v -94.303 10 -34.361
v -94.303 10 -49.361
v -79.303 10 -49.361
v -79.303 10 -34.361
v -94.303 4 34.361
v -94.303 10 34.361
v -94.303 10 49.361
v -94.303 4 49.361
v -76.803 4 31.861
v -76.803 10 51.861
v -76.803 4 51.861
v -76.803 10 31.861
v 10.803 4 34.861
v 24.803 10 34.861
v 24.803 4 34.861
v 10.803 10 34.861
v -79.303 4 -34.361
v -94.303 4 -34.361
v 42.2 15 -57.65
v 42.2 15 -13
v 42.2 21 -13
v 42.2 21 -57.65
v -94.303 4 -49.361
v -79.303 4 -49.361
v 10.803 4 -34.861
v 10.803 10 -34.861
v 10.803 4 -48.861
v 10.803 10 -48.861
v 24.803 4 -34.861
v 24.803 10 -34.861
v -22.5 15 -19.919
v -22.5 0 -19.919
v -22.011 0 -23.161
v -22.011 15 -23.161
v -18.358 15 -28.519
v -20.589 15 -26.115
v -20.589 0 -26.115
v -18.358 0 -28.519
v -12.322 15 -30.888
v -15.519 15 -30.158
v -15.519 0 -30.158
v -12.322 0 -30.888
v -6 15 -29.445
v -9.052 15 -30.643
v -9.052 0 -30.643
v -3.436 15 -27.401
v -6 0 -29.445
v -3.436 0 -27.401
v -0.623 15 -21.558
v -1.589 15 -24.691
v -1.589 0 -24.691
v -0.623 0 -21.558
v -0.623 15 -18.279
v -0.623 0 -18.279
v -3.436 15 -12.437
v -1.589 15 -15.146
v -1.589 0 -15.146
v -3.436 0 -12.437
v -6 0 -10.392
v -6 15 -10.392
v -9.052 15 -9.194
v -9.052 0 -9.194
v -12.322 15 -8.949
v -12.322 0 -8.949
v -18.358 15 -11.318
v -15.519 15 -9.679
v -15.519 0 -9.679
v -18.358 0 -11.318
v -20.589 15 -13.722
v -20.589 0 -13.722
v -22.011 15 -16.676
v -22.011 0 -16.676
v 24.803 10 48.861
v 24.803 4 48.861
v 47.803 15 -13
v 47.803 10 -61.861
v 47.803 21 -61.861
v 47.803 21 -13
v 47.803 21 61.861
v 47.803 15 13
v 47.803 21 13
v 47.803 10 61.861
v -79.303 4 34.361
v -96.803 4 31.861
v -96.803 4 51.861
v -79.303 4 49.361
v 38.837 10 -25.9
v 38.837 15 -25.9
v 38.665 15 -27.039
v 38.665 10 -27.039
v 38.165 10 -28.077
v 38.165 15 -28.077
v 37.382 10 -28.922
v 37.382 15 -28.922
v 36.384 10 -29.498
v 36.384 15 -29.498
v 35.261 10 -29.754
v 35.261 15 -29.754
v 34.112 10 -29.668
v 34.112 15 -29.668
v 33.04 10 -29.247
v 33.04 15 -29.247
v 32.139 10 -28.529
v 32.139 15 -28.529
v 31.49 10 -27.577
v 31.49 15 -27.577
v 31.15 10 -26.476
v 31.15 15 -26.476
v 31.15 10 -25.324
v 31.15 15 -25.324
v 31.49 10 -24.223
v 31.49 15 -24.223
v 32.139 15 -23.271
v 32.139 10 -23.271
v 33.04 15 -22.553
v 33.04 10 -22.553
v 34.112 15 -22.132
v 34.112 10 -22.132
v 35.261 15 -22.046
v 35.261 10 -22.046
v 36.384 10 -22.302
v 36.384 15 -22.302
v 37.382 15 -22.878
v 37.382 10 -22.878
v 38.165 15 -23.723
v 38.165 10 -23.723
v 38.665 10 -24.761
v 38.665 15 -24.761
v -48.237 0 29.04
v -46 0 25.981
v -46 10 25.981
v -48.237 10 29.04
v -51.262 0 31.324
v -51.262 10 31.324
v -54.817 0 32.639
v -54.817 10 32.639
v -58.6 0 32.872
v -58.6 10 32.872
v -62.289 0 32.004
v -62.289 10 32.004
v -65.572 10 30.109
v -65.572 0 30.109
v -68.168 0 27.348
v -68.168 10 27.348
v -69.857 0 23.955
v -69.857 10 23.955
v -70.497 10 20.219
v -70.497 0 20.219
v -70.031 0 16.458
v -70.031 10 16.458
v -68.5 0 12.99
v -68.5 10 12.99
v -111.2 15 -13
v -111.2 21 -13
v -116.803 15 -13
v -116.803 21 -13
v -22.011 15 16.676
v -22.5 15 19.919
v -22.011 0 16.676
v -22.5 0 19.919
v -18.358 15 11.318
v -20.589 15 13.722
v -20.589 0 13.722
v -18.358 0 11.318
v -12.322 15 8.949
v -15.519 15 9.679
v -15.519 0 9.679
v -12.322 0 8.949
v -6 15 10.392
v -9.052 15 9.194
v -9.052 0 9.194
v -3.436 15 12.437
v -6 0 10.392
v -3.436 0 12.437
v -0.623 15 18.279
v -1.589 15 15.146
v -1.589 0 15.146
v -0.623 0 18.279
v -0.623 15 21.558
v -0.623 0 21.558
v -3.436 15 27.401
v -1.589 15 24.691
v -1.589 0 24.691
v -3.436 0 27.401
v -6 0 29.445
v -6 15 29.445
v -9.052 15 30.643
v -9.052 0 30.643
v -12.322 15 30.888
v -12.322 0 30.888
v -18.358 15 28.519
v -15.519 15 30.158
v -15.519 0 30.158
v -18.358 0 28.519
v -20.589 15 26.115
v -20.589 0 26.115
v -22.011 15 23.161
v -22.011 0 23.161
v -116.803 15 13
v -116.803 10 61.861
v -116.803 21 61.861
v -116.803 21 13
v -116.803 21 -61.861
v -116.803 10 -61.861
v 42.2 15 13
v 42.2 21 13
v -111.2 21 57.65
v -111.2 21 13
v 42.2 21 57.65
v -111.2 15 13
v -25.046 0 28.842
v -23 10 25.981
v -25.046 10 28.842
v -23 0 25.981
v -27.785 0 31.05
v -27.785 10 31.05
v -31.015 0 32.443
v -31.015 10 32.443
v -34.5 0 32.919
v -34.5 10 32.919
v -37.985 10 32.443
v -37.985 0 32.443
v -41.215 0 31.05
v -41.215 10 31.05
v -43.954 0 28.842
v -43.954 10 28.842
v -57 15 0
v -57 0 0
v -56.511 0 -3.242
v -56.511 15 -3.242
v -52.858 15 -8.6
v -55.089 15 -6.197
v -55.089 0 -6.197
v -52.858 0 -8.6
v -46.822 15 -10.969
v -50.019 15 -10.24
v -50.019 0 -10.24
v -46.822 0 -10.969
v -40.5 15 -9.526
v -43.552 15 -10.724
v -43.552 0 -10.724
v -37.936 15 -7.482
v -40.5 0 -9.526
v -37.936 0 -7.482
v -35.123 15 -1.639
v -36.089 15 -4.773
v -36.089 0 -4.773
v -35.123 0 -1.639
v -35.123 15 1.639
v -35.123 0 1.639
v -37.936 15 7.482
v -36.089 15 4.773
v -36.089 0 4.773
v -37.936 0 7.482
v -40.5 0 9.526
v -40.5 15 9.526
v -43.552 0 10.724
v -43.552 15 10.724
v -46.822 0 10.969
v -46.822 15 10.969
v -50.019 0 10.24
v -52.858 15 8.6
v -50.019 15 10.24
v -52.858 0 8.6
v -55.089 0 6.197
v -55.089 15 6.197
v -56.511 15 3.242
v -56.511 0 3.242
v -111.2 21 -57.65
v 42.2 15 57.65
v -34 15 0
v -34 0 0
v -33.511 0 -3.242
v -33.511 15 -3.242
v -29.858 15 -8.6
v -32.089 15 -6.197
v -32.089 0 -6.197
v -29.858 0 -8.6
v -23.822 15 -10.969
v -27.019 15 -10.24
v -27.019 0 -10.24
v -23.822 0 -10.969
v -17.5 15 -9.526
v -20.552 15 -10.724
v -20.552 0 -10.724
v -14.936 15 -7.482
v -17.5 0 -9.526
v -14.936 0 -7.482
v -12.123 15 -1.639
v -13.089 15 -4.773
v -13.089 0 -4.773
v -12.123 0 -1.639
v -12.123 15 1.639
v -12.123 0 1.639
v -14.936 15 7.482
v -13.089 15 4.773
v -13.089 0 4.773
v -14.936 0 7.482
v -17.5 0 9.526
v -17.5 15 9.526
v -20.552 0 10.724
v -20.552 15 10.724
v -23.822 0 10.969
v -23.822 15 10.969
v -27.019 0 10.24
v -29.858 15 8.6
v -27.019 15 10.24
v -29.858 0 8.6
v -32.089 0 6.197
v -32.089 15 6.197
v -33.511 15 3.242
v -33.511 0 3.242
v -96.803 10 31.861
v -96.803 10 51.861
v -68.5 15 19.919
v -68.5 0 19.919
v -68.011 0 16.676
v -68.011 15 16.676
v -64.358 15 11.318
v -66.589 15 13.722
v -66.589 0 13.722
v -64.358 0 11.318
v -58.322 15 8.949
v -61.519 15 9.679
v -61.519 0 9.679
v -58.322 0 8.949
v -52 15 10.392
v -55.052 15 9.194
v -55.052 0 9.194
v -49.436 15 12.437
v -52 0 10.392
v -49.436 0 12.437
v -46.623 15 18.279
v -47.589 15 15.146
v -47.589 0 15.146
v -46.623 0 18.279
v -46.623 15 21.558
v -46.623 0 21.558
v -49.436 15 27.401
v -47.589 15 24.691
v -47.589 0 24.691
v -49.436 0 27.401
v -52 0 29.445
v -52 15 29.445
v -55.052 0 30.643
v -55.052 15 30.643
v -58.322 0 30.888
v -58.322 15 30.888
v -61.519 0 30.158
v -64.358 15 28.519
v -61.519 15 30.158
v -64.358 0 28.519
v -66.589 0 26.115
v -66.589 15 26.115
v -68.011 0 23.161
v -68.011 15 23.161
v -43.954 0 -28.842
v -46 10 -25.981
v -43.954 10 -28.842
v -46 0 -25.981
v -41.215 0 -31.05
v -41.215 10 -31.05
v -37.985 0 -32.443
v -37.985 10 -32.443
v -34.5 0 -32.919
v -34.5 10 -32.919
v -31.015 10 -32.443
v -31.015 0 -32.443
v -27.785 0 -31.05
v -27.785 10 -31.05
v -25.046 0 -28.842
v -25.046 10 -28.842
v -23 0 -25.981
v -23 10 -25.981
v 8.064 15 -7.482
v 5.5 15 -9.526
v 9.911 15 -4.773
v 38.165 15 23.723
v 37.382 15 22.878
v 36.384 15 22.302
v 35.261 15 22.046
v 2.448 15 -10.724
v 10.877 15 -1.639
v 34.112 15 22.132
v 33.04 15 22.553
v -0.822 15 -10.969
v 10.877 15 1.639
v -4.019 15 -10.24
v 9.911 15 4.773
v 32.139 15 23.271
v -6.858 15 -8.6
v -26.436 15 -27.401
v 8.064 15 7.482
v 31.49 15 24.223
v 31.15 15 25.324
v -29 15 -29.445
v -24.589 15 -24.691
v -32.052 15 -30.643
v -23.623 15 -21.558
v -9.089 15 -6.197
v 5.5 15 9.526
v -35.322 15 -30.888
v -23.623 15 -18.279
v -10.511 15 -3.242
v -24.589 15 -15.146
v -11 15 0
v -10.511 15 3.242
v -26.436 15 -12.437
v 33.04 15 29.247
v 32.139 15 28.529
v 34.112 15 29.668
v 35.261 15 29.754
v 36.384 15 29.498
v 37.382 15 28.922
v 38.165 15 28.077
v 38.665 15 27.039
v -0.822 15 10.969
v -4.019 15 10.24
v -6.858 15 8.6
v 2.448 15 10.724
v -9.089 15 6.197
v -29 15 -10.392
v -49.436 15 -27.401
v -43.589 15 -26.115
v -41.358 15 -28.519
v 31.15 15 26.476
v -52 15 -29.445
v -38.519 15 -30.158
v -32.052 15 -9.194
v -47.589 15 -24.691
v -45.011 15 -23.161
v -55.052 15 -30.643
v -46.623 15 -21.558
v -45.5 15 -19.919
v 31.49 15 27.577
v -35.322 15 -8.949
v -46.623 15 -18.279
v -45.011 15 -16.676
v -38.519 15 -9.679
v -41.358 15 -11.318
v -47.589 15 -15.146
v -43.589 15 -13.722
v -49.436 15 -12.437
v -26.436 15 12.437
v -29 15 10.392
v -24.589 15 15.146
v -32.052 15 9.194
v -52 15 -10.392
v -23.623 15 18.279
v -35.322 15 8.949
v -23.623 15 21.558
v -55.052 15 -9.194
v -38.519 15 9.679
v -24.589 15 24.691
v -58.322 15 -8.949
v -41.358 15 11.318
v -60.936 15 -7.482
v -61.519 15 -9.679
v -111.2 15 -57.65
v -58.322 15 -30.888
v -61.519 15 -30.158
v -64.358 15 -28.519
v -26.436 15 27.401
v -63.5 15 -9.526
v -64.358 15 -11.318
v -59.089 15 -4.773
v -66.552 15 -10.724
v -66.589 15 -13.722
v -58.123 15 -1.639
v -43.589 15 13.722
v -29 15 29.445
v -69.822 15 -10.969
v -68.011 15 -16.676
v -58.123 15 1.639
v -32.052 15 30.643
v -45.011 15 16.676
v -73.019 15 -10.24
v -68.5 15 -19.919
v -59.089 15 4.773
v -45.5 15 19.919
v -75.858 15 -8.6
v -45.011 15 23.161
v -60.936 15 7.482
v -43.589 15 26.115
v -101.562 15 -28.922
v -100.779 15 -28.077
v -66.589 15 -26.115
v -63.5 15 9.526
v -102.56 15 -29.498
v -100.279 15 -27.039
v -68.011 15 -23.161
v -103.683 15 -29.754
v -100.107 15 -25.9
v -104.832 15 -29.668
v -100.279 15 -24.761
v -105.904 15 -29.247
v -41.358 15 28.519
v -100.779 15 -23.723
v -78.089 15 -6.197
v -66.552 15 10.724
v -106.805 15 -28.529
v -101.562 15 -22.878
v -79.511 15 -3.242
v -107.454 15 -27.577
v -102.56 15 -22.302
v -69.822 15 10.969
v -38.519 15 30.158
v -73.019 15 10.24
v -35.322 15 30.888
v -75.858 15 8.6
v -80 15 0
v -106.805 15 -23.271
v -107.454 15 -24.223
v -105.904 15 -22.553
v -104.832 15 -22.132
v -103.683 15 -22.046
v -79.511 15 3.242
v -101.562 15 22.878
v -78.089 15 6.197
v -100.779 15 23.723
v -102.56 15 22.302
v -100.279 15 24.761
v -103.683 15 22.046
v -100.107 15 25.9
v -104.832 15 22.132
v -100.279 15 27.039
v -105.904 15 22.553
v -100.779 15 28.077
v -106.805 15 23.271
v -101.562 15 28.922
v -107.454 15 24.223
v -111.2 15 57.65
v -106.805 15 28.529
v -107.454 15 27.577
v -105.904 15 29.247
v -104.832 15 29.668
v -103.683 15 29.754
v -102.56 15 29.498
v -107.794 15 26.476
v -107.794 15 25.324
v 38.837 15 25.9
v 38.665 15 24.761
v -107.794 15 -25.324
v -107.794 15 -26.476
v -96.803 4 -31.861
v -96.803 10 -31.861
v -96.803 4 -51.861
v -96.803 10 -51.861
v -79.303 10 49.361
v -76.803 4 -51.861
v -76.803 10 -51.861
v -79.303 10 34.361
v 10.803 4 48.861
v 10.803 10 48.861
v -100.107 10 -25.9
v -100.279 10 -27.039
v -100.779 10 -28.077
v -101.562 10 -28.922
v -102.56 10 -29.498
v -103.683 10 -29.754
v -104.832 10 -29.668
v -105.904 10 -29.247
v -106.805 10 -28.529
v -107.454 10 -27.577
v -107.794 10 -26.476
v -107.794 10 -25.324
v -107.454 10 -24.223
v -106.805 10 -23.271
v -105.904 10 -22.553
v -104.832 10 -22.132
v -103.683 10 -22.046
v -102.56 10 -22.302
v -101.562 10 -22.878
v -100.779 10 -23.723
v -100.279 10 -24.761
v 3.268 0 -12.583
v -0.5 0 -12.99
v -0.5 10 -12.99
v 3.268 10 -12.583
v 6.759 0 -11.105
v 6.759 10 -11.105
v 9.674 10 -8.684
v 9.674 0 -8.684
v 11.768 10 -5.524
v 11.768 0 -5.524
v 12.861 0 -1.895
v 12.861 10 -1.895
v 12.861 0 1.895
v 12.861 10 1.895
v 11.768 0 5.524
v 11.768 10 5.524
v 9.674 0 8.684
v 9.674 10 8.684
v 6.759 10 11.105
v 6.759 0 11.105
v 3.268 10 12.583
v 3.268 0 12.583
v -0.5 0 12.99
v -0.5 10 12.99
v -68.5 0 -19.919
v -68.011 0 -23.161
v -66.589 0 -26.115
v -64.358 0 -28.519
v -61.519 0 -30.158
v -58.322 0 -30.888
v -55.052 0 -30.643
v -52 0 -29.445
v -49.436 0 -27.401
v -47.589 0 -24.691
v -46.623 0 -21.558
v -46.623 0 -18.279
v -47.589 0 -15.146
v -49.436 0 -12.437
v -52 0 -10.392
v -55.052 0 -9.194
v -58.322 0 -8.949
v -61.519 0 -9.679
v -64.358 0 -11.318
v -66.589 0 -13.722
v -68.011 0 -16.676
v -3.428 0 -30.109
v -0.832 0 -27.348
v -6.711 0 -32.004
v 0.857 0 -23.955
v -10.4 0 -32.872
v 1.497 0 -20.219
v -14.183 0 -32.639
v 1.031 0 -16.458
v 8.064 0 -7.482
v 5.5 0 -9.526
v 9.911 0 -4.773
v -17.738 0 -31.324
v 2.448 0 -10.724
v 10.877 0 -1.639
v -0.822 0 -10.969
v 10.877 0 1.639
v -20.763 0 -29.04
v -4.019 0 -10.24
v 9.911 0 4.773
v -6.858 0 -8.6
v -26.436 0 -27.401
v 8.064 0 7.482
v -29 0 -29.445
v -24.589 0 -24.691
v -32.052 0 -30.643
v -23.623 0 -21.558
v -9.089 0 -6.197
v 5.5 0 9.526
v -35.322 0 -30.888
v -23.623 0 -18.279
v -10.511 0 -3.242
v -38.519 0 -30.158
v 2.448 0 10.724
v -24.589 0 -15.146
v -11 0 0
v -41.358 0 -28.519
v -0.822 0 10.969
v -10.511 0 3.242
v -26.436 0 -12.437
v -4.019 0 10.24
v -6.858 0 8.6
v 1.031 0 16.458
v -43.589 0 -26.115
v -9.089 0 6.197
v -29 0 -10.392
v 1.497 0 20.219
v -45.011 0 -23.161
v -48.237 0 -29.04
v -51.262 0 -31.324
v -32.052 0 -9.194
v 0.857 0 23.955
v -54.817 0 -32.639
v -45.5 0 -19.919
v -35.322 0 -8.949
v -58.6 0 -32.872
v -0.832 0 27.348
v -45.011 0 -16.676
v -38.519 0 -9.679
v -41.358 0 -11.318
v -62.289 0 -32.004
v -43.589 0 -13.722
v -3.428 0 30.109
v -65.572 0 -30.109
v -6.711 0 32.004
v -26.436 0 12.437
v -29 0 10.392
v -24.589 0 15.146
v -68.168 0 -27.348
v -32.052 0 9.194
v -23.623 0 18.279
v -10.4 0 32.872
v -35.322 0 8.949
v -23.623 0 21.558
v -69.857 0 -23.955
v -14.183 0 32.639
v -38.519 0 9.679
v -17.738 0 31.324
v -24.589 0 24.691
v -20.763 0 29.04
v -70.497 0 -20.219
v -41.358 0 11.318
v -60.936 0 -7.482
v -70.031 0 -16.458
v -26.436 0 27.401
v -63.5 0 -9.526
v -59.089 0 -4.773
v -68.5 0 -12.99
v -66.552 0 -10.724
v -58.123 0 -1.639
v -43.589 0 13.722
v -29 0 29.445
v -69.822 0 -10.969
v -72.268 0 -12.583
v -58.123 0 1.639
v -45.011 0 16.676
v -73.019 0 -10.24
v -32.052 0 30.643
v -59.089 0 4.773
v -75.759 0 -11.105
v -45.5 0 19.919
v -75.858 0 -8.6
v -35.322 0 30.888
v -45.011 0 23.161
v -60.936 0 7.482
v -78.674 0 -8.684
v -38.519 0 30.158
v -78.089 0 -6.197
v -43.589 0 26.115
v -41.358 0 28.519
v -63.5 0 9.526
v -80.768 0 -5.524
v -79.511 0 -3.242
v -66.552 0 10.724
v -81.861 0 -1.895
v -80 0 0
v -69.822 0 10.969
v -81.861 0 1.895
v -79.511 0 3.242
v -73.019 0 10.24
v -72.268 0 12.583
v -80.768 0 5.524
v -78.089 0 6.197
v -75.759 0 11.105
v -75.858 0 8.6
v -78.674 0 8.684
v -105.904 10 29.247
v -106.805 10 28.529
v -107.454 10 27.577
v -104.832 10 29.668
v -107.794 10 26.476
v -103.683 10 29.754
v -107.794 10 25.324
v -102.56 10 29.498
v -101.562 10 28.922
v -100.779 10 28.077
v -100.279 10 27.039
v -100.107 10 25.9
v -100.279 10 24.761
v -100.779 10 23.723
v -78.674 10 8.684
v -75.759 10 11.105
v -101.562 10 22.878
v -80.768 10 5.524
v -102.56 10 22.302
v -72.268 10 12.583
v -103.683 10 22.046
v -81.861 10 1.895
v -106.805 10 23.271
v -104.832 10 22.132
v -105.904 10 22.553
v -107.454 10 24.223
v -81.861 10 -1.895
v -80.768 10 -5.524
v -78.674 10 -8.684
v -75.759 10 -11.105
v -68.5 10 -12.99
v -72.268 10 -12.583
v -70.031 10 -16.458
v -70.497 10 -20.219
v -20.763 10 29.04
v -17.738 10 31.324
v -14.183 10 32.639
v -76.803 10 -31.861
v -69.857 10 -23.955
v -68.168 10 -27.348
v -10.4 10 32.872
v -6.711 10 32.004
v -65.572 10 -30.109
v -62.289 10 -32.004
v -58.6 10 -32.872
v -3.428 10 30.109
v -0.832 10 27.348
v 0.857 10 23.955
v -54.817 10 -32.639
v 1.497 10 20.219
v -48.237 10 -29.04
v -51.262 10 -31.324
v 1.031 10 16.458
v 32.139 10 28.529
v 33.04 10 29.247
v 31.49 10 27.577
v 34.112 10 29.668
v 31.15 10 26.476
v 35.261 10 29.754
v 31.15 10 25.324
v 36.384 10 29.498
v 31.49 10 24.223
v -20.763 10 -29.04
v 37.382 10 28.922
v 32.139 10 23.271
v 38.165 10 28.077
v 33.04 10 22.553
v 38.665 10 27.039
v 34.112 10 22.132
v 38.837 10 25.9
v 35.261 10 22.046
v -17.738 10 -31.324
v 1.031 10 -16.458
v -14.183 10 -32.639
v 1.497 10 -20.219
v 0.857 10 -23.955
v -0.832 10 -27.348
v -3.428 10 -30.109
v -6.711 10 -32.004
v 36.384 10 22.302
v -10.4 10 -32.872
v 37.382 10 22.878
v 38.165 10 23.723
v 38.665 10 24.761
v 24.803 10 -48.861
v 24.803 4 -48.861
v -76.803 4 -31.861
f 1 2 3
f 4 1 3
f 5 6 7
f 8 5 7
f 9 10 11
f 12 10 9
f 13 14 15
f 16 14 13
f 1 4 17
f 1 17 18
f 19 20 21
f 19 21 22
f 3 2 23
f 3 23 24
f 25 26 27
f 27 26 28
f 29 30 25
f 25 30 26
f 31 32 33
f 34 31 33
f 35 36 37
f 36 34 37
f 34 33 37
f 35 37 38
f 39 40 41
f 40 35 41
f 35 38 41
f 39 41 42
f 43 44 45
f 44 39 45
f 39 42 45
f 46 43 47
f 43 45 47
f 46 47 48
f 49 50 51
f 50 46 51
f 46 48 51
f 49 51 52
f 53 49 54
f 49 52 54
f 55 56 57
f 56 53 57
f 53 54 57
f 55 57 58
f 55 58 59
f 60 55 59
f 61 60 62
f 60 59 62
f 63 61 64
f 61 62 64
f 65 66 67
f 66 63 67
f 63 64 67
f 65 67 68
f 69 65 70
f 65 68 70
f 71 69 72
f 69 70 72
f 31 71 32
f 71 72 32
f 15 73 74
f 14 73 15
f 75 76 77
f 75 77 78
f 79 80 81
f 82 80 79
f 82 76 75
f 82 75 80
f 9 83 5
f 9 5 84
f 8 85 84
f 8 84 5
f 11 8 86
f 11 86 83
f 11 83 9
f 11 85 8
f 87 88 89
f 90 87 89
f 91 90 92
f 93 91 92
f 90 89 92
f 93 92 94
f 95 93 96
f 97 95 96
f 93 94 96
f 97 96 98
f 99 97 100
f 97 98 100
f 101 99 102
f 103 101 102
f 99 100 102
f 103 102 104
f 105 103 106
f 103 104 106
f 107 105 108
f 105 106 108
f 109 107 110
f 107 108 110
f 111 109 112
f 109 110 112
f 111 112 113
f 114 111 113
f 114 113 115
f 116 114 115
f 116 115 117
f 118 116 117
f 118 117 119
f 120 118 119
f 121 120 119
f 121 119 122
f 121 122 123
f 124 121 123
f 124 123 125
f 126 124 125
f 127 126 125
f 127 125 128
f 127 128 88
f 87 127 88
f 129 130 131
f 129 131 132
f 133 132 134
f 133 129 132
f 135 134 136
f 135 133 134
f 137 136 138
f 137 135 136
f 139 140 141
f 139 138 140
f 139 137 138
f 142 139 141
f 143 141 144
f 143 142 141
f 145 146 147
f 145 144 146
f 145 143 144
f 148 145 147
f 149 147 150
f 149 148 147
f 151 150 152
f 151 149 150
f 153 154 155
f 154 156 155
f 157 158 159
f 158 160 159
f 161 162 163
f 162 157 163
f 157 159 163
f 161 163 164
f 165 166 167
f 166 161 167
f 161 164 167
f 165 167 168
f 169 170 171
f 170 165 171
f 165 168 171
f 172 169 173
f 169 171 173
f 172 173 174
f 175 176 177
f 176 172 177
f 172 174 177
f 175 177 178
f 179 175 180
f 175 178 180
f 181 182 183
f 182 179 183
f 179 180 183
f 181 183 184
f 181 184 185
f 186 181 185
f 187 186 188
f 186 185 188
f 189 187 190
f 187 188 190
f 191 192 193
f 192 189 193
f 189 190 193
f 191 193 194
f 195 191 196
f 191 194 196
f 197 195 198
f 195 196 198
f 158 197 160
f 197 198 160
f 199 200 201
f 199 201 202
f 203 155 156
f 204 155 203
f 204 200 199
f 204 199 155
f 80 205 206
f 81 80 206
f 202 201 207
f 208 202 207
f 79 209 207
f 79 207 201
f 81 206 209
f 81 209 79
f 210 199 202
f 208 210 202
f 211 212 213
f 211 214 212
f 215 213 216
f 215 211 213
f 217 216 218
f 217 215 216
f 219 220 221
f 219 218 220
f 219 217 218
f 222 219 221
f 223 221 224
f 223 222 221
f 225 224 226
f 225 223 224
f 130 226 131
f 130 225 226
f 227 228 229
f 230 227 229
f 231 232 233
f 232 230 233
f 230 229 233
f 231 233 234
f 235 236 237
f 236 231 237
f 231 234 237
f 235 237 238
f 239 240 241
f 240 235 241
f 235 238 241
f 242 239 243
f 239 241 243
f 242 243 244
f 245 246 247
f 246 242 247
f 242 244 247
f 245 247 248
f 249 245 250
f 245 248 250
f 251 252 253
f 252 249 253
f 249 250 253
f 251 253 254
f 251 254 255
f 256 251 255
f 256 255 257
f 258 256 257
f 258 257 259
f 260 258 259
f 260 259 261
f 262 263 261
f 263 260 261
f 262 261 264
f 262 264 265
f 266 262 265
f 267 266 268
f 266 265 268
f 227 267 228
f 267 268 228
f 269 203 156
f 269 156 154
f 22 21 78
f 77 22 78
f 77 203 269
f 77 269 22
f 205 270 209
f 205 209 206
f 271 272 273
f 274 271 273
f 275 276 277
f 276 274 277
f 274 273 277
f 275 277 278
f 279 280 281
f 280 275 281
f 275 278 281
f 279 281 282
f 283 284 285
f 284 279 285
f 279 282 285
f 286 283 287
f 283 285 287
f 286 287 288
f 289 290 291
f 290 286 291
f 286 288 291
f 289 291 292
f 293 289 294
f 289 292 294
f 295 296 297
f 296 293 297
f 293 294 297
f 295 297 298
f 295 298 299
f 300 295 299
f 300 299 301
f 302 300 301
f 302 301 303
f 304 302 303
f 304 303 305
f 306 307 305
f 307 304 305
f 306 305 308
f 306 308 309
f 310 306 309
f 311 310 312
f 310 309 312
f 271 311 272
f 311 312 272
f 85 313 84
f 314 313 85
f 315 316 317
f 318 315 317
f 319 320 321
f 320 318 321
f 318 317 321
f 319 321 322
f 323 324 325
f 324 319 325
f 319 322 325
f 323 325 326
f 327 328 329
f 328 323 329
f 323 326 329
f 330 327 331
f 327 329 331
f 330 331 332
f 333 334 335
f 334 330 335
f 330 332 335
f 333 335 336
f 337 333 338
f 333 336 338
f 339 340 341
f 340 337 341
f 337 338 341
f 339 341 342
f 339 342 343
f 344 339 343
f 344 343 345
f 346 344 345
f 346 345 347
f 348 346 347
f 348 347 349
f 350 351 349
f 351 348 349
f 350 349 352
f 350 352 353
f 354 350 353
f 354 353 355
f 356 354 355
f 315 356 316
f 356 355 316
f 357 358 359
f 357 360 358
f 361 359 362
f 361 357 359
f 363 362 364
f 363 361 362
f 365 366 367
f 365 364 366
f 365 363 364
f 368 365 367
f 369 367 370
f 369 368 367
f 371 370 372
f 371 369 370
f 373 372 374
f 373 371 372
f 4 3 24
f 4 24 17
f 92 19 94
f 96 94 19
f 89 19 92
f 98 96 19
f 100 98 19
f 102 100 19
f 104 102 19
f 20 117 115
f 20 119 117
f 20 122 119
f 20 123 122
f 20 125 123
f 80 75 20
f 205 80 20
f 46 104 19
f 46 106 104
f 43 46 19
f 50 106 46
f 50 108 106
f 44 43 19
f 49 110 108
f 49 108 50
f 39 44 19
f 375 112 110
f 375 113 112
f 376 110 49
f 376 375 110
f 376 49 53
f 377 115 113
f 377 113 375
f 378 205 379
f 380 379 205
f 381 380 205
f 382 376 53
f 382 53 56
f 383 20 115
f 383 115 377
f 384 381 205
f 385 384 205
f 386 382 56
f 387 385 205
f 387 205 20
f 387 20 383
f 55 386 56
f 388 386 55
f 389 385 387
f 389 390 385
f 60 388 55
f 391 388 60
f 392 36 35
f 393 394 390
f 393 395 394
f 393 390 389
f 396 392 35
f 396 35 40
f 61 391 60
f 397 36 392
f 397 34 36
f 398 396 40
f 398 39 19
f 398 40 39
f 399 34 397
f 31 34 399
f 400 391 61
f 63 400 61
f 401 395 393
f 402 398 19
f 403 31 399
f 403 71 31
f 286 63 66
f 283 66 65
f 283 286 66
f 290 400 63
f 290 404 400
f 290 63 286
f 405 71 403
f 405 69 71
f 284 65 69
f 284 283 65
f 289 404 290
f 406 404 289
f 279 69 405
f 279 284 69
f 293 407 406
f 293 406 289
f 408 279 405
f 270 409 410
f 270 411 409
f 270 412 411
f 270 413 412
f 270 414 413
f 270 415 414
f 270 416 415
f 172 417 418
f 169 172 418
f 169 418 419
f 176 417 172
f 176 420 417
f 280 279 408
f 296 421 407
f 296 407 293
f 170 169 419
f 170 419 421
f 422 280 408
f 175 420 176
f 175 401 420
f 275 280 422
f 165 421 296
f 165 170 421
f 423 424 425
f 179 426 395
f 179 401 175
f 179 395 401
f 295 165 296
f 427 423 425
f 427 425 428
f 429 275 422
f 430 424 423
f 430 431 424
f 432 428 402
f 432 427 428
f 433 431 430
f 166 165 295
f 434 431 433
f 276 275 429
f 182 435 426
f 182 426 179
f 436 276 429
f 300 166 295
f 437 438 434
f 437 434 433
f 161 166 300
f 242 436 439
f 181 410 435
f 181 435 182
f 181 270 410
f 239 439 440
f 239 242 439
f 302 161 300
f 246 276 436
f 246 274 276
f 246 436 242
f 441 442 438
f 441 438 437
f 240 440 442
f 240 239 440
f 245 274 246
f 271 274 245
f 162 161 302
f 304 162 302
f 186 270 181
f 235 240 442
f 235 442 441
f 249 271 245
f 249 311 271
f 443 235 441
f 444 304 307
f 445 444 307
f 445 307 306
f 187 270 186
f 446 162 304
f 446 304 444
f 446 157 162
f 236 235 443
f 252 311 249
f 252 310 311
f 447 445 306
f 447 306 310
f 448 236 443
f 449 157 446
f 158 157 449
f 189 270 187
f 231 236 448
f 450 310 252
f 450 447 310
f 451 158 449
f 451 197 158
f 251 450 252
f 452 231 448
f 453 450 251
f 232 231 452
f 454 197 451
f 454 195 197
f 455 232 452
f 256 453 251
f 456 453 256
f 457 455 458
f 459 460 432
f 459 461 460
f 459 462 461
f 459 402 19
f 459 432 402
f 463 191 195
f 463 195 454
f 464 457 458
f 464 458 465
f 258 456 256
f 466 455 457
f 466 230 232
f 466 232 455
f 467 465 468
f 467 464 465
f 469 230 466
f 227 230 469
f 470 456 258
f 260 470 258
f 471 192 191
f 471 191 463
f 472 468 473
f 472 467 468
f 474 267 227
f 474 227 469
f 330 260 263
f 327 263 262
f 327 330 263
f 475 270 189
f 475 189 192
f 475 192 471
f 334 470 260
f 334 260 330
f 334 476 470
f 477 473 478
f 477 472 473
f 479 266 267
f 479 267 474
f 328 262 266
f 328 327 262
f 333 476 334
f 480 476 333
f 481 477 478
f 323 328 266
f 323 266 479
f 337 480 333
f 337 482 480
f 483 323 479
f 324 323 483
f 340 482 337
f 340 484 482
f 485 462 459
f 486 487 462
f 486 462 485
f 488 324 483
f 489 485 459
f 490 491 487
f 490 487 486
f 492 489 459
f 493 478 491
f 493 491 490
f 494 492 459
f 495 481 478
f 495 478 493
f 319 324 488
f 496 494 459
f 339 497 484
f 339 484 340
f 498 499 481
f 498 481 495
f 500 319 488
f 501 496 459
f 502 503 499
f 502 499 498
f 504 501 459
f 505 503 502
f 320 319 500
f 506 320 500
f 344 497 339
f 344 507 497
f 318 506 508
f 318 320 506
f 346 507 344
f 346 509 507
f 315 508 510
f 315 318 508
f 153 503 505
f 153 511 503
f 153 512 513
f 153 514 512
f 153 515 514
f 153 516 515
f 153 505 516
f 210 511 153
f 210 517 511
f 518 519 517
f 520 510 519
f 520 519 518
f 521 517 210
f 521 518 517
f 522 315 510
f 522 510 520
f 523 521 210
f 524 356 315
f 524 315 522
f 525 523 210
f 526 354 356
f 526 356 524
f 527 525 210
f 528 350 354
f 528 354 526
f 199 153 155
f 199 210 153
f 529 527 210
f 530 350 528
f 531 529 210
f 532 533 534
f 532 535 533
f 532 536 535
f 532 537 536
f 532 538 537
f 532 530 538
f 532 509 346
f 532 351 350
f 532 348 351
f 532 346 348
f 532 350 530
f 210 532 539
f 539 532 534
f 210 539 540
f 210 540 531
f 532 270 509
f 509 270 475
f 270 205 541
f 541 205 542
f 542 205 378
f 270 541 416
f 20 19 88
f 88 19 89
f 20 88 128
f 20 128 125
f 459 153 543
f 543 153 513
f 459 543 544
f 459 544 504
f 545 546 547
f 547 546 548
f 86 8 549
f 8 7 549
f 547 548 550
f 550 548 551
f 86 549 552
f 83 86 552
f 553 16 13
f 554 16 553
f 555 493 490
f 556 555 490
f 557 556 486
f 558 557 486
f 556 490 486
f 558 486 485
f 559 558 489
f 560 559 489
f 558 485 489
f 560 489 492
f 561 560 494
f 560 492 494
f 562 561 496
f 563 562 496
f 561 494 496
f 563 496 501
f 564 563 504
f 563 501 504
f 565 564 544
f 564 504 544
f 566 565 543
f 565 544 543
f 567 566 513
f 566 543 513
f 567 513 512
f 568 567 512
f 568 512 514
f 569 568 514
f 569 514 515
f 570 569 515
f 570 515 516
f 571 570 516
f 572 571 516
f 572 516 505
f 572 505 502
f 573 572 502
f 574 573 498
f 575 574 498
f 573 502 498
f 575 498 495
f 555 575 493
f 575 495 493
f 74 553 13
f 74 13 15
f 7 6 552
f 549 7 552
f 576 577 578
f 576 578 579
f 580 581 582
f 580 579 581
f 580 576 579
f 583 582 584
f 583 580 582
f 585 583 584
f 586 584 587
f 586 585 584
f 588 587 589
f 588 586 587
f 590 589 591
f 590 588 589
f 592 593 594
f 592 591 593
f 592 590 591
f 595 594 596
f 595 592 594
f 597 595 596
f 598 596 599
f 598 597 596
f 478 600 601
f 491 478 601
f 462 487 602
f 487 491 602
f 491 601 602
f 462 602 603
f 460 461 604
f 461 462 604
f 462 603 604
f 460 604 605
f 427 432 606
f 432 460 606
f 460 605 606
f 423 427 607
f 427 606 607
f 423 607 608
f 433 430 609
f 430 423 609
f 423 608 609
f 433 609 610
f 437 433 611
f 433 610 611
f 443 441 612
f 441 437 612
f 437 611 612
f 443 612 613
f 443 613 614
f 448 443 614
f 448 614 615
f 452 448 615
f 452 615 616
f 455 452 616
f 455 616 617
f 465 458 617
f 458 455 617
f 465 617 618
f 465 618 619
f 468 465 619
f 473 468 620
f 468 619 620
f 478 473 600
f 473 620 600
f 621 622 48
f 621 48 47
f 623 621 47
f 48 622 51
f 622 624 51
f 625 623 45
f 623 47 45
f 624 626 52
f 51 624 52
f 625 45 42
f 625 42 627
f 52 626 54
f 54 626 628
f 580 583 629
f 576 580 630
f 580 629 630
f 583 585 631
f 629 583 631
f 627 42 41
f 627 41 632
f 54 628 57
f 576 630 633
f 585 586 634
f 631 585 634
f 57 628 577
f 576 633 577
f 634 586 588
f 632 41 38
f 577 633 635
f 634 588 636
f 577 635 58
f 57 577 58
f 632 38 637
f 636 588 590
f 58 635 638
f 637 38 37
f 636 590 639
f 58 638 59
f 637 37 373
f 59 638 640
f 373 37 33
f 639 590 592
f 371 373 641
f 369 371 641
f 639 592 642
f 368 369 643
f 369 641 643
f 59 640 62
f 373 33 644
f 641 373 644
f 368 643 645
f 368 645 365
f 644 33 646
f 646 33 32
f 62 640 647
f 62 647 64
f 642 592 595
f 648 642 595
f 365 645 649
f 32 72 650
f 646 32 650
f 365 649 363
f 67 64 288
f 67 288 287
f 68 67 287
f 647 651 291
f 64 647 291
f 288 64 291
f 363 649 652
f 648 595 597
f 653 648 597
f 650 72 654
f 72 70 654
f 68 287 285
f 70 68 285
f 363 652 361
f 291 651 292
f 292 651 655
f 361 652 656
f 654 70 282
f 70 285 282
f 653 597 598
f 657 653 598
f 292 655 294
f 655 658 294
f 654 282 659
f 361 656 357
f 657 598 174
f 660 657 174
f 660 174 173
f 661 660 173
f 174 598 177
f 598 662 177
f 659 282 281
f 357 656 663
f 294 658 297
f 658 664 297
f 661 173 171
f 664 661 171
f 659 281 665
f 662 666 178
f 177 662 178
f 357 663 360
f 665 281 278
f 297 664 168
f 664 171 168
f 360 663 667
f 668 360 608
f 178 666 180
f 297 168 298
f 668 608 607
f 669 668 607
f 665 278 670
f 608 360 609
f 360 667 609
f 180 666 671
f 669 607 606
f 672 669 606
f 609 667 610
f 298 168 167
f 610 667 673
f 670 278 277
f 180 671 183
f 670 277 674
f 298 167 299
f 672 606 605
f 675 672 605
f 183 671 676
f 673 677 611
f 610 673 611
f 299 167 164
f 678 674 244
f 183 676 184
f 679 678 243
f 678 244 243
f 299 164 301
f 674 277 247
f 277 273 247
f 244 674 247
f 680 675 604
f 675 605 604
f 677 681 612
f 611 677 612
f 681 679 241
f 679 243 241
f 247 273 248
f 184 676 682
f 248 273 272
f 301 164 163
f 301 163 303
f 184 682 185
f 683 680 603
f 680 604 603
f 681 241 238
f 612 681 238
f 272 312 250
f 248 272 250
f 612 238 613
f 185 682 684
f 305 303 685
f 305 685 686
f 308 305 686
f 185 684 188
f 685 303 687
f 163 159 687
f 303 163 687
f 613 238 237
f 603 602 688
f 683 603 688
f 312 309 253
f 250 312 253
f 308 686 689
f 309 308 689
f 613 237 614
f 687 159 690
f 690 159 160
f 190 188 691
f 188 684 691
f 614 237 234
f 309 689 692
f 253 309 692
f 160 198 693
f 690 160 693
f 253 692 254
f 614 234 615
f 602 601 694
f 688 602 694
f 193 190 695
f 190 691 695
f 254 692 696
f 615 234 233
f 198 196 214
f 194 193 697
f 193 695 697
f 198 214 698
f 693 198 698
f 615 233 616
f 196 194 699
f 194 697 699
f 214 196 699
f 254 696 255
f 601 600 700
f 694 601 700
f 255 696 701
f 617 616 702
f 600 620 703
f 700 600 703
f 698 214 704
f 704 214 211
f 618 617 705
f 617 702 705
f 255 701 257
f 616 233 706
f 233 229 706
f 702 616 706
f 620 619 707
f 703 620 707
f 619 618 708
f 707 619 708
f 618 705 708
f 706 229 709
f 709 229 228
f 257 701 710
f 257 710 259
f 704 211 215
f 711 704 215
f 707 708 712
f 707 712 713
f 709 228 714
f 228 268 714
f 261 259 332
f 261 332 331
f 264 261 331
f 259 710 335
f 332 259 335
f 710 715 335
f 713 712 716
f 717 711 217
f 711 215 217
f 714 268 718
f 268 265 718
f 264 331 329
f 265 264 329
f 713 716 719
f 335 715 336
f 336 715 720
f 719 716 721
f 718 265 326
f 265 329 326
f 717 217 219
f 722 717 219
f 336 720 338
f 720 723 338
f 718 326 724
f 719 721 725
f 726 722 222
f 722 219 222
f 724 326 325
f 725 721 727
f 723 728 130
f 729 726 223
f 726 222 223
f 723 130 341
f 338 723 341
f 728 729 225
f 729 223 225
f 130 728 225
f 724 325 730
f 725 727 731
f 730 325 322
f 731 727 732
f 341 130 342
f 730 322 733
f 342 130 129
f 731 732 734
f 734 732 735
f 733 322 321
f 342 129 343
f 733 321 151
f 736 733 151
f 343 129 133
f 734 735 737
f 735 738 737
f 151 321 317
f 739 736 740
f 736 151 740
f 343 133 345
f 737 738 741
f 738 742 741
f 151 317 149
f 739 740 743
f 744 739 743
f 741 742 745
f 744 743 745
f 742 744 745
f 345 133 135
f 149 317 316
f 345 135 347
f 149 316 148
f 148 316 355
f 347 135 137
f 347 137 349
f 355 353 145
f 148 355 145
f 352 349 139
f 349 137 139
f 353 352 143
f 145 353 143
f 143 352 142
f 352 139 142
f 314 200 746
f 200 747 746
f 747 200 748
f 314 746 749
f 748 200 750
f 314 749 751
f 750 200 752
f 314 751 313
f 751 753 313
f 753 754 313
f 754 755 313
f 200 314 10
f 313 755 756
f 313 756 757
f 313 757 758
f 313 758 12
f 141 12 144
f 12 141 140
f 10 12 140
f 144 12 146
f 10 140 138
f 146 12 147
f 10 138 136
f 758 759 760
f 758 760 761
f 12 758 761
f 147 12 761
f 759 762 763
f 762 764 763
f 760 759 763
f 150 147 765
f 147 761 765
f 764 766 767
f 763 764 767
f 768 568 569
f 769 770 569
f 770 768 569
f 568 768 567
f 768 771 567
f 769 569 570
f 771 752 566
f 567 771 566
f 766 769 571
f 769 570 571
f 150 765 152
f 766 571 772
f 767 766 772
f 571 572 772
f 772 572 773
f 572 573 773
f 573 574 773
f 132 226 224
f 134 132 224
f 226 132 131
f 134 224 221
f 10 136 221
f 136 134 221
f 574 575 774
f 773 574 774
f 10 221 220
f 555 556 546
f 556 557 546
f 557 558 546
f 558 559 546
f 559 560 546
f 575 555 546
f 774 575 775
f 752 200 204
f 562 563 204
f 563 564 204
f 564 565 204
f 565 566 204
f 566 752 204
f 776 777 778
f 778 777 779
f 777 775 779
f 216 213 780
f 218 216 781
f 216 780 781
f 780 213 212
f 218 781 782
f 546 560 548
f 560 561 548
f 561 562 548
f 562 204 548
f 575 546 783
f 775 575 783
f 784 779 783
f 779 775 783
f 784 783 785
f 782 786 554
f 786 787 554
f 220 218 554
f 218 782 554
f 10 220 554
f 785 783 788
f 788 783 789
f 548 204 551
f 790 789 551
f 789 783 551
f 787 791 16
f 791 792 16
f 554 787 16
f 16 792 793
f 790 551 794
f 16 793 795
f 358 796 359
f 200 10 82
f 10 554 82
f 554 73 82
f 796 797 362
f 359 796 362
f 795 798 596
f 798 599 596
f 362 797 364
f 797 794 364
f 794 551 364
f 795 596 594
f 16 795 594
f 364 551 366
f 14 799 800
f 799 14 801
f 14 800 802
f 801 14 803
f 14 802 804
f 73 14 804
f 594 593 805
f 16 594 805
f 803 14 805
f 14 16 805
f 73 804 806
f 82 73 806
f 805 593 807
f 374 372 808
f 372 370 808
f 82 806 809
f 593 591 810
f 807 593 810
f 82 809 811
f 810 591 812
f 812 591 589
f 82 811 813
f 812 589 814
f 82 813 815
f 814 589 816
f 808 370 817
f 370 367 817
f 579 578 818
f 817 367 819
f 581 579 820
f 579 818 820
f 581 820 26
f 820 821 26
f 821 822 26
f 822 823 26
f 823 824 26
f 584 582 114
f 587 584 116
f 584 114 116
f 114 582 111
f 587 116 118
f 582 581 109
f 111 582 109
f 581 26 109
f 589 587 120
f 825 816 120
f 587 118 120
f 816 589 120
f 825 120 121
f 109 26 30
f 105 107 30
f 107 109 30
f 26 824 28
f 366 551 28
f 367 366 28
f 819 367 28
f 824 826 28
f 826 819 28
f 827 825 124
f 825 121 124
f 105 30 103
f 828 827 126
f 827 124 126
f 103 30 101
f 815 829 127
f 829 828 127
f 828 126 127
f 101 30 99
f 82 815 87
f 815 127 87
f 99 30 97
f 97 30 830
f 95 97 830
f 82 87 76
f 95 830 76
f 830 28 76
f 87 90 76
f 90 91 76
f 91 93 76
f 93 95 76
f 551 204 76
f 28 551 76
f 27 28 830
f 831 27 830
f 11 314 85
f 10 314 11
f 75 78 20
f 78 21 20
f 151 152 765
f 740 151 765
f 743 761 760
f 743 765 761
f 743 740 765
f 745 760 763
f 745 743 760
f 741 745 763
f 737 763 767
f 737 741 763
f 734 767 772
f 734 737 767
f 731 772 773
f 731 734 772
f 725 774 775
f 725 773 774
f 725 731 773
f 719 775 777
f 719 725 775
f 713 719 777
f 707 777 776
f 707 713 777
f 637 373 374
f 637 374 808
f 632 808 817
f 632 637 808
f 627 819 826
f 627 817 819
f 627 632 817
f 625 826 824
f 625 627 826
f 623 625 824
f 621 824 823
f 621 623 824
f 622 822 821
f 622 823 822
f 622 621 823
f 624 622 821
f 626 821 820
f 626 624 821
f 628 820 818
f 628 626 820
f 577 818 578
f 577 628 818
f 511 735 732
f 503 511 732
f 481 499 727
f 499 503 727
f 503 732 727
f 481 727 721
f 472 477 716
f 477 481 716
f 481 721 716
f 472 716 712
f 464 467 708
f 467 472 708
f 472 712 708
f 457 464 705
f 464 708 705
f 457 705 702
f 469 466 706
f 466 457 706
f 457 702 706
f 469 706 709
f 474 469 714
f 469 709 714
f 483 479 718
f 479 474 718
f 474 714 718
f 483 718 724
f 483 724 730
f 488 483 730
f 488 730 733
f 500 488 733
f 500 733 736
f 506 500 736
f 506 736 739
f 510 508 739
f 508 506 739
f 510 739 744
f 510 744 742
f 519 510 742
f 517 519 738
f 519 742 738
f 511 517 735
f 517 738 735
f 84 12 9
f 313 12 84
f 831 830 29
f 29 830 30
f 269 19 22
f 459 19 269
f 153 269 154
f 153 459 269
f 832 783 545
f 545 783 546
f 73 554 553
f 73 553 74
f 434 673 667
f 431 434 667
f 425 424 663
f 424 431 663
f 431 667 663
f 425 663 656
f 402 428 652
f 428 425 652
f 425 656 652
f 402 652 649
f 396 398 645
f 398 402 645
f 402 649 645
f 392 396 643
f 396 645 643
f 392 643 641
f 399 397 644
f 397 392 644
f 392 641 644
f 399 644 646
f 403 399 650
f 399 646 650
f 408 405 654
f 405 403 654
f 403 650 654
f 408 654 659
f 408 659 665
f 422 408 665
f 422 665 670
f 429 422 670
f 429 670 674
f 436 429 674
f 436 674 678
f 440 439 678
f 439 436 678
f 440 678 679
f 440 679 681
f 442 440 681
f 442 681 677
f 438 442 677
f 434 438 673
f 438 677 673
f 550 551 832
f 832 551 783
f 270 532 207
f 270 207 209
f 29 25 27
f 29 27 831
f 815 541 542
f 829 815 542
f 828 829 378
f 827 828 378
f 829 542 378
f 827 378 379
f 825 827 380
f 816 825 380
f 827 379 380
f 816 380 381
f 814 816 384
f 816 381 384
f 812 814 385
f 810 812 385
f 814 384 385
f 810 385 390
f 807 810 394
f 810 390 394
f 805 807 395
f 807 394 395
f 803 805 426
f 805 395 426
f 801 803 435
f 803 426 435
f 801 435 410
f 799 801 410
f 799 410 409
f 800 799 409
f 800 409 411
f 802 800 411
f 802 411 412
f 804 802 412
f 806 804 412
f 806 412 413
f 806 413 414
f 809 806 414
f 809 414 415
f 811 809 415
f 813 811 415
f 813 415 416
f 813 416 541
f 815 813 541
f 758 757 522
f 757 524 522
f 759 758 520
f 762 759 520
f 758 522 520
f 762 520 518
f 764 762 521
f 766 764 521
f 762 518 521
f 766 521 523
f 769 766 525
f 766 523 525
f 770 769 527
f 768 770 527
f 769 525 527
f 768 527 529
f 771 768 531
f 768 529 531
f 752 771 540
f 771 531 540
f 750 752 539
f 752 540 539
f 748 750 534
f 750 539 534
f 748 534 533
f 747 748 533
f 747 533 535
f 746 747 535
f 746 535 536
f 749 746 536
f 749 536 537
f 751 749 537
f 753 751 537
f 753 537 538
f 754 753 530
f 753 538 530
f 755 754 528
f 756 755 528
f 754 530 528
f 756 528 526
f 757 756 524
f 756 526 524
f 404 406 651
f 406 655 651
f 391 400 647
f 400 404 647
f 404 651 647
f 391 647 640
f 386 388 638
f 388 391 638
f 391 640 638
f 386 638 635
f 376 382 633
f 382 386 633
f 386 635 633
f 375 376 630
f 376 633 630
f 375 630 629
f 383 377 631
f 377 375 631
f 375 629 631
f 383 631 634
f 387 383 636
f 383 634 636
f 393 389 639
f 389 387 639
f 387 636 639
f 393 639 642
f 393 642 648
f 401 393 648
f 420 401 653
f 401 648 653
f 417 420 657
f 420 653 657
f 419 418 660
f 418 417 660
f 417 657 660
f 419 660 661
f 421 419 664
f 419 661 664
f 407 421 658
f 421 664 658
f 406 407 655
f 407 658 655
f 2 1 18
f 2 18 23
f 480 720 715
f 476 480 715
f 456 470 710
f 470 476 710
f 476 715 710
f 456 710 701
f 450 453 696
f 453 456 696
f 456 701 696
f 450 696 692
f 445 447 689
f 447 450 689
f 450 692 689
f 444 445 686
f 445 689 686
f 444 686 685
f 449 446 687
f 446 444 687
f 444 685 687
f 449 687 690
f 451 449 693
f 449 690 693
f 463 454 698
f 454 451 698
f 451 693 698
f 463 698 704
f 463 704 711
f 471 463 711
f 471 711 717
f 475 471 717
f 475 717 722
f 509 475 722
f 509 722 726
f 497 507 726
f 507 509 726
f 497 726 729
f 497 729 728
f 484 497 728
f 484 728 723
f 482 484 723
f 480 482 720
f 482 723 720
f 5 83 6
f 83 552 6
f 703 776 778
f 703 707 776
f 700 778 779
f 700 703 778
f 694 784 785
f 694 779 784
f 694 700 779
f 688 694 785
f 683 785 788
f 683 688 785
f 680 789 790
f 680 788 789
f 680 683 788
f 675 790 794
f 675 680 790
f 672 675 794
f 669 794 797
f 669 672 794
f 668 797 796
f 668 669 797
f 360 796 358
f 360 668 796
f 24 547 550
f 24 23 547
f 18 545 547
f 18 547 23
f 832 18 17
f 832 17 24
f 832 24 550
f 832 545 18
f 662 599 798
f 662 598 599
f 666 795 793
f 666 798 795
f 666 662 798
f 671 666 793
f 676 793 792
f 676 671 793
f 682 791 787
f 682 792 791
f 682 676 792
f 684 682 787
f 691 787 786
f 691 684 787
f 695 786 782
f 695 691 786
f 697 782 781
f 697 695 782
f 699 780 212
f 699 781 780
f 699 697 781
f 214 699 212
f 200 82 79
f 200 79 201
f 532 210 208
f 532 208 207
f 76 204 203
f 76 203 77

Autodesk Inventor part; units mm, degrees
ref_plane "YZ Plane" through (0, 0, 0) normal (1, 0, 0) x (0, 1, 0)
ref_plane "XZ Plane" through (0, 0, 0) normal (0, 1, 0) x (-1, 0, 0)
ref_plane "XY Plane" through (0, 0, 0) normal (0, 0, 1) x (1, 0, 0)
sketch "Sketch1" plane through (0, 0, 0) normal (0, 1, 0) x (-1, 0, 0)
  circle A0 centre (0, 0) radius 11
  line L0 (11, 0.0002) -> (12, 0.0002) construction
  circle A1 centre (23, 0) radius 11
  line L1 (34, 0) -> (35, 0) construction
  circle A2 centre (46, 0) radius 11
  line L2 (57, 0) -> (58, 0) construction
  circle A3 centre (69, 0) radius 11
  line L3 (34.5, 0) -> (34.5, -17.154) construction
  line L4 (34.5, 0) -> (34.5, 17.658) construction
  line L5 (55, 12.6387) -> (55, -13.5831) construction
  line L6 (55, 12.6387) -> (55, 17.658) construction
  line L7 (55, -13.5831) -> (55, -17.154) construction
  line L8 (11.5, 0.0002) -> (11.5, -16.2579) construction
  line L9 (11.5, 0.0002) -> (11.5, 19.9186) construction
  circle A4 centre (0, 0) radius 12 construction
  circle A5 centre (23, 0) radius 12 construction
  circle A6 centre (46, 0) radius 12 construction
  circle A7 centre (69, 0) radius 12 construction
  circle A8 centre (11.5, 19.9186) radius 11
  circle A9 centre (34.5, 19.9186) radius 11
  circle A10 centre (11.5, -19.9186) radius 11
  circle A11 centre (57.5, 19.9186) radius 11
  circle A12 centre (57.5, -19.9186) radius 12 construction
  circle A13 centre (34.5, -19.9186) radius 12 construction
  circle A14 centre (11.5, 19.9186) radius 12 construction
  circle A15 centre (34.5, 19.9186) radius 12 construction
  circle A16 centre (57.5, 19.9186) radius 12 construction
  line L10 (11.5, 19.9186) -> (57.5, 19.9186) construction
  arc A17 (2.3131, -12.7926) -> (0.5, -12.9904) centre (0, 0) ccw construction
  circle A18 centre (11.5, 19.9186) radius 13 construction
  circle A19 centre (34.5, 19.9186) radius 13 construction
  circle A20 centre (57.5, 19.9186) radius 13 construction
  circle A21 centre (69, 0) radius 13 construction
  circle A22 centre (57.5, -19.9186) radius 13 construction
  circle A23 centre (34.5, -19.9186) radius 13 construction
  arc A24 (0.5, 12.9904) -> (0.5, -12.9904) centre (0, 0) ccw
  line L11 (57.5, -19.9186) -> (11.5, -19.9186) construction
  circle A25 centre (11.5, -19.9186) radius 13 construction
  arc A26 (0.5, -12.9904) -> (23, -25.9808) centre (11.5, -19.9186) ccw
  arc A27 (23, -25.9808) -> (46, -25.9808) centre (34.5, -19.9186) ccw
  arc A28 (46, -25.9808) -> (68.5, -12.9904) centre (57.5, -19.9186) ccw
  arc A29 (68.5, -12.9904) -> (68.5, 12.9904) centre (69, 0) ccw
  arc A30 (68.5, 12.9904) -> (46, 25.9808) centre (57.5, 19.9186) ccw
  arc A31 (46, 25.9808) -> (23, 25.9808) centre (34.5, 19.9186) ccw
  arc A32 (23, 25.9808) -> (0.5, 12.9904) centre (11.5, 19.9186) ccw
  circle A33 centre (11.5, -19.9186) radius 12 construction
  circle A34 centre (34.5, -19.9186) radius 11
  circle A35 centre (57.5, -19.9186) radius 11
  dimension "d0" = 22
  dimension "d6" = 22
  dimension "d1" = 1
  dimension "d2" = 22
  dimension "d3" = 1
  dimension "d4" = 22
  dimension "d5" = 1
  dimension "d7" = 24
  dimension "d8" = 24
  dimension "d9" = 24
  dimension "d10" = 24
  dimension "d11" = 22
  dimension "d12" = 22
  dimension "d16" = 22
  dimension "d17" = 22
  dimension "d19" = 24
  dimension "d21" = 24
  dimension "d22" = 24
  dimension "d23" = 24
  dimension "d25" = 26
  dimension "d27" = 26
  dimension "d28" = 26
  dimension "d29" = 26
  dimension "d30" = 26
  dimension "d31" = 26
  dimension "d32" = 26
  dimension "d33" = 26
  dimension "d67" = 24
  dimension "d71" = 24
  dimension "d72" = 22
  dimension "d73" = 22
extrude "Extrusion1" add sketch "Sketch1" along normal blind 15
sketch "Sketch2" plane through (0, 15, 0) normal (0, 1, 0) x (1, 0, 0)
  circle A0 centre (-23, 0) radius 11 projected
  circle A1 centre (-46, 0) radius 11 projected
  line L0 (-35, 0) -> (-34, 0) construction
  line L1 (-111.2, 57.65) -> (42.2, 57.65)
  line L2 (42.2, 57.65) -> (42.2, -57.65)
  line L3 (42.2, -57.65) -> (-111.2, -57.65)
  line L4 (-111.2, -57.65) -> (-111.2, 57.65)
  line L5 (-111.2, 57.65) -> (42.2, -57.65) construction
  line L6 (42.2, 57.65) -> (-111.2, -57.65) construction
  arc A2 (-46, 25.9808) -> (-68.5, 12.9904) centre (-57.5, 19.9186) ccw projected
  arc A3 (-23, 25.9808) -> (-46, 25.9808) centre (-34.5, 19.9186) ccw projected
  arc A4 (-0.5, 12.9904) -> (-23, 25.9808) centre (-11.5, 19.9186) ccw projected
  arc A5 (-0.5, -12.9904) -> (-0.5, 12.9904) centre (0, 0) ccw projected
  arc A6 (-23, -25.9808) -> (-0.5, -12.9904) centre (-11.5, -19.9186) ccw projected
  arc A7 (-46, -25.9808) -> (-23, -25.9808) centre (-34.5, -19.9186) ccw projected
  arc A8 (-68.5, -12.9904) -> (-46, -25.9808) centre (-57.5, -19.9186) ccw projected
  arc A9 (-68.5, 12.9904) -> (-68.5, -12.9904) centre (-69, 0) ccw projected
  arc A10 (-69, 13) -> (-68.5, -12.9904) centre (-69, 0) ccw
  arc A11 (-46, 25.9808) -> (-68.5, 12.9904) centre (-57.5, 19.9186) ccw
  arc A12 (-23, 25.9808) -> (-46, 25.9808) centre (-34.5, 19.9186) ccw
  arc A13 (-0.5, 12.9904) -> (-23, 25.9808) centre (-11.5, 19.9186) ccw
  arc A14 (-0.5, -12.9904) -> (-0.5, 12.9904) centre (0, 0) ccw
  arc A15 (-23, -25.9808) -> (-0.5, -12.9904) centre (-11.5, -19.9186) ccw
  arc A16 (-46, -25.9808) -> (-23, -25.9808) centre (-34.5, -19.9186) ccw
  arc A17 (-68.5, -12.9904) -> (-46, -25.9808) centre (-57.5, -19.9186) ccw
  arc A18 (-68.5, 12.9904) -> (-68.5, -12.9904) centre (-69, 0) ccw
  point P0 (-34.5, 0)
  dimension "d36" = 115.3
  dimension "d37" = 153.4
extrude "Extrusion2" add sketch "Sketch2" against normal blind 5 contours L1 L2 L3 L4
sketch "Sketch3" plane through (0, 15, 0) normal (0, 1, 0) x (1, 0, 0)
  line L0 (42.2, 57.65) -> (-111.2, 57.65) projected
  line L1 (42.2, -57.65) -> (42.2, 57.65) projected
  line L2 (-111.2, -57.65) -> (42.2, -57.65) projected
  line L3 (-111.2, 57.65) -> (-111.2, -57.65) projected
  line L4 (-111.2, -57.65) -> (42.2, -57.65) projected
  line L5 (42.2, -57.65) -> (42.2, 57.65) projected
  line L6 (42.2, 57.65) -> (-111.2, 57.65) projected
  line L7 (-111.2, 57.65) -> (-111.2, -57.65) projected
  circle A0 centre (-57.5, -19.9186) radius 11 projected
  circle A1 centre (-11.5, 19.9186) radius 11 projected
  circle A2 centre (-34.5, -19.9186) radius 11 projected
  circle A3 centre (-11.5, -19.9186) radius 11 projected
  circle A4 centre (-69, 0) radius 11 projected
  circle A5 centre (-46, 0) radius 11 projected
  circle A6 centre (-23, 0) radius 11 projected
  circle A7 centre (0, 0) radius 11 projected
  line L8 (-116.8026, 61.8611) -> (47.8026, 61.8611)
  line L9 (47.8026, 61.8611) -> (47.8026, -61.8611)
  line L10 (47.8026, -61.8611) -> (-116.8026, -61.8611)
  line L11 (-116.8026, -61.8611) -> (-116.8026, 61.8611)
  line L12 (-116.8026, 61.8611) -> (47.8026, -61.8611) construction
  line L13 (47.8026, 61.8611) -> (-116.8026, -61.8611) construction
  line L14 (-111.2, -57.65) -> (42.2, -57.65)
  line L15 (42.2, -57.65) -> (42.2, 57.65)
  line L16 (42.2, 57.65) -> (-111.2, 57.65)
  line L17 (-111.2, 57.65) -> (-111.2, -57.65)
  line L18 (-111.2, -57.65) -> (42.2, 57.65) construction
  line L19 (42.2, -57.65) -> (-111.2, 57.65) construction
  point P0 (-34.5, 0)
extrude "Extrusion3" add sketch "Sketch3" along normal blind 6 and the other way blind 5 contours L8 L9 L10 L11
sketch "Sketch4" plane through (0, 15, 0) normal (0, 1, 0) x (1, 0, 0)
  line L0 (-111.2, -57.65) -> (42.2, -57.65) projected
  line L1 (42.2, -57.65) -> (42.2, 57.65) projected
  line L2 (42.2, 57.65) -> (-111.2, 57.65) projected
  line L3 (-111.2, 57.65) -> (-111.2, -57.65) projected
  circle A0 centre (-57.5, -19.9186) radius 11 projected
  circle A1 centre (-11.5, 19.9186) radius 11 projected
  circle A2 centre (-34.5, -19.9186) radius 11 projected
  circle A3 centre (-11.5, -19.9186) radius 11 projected
  circle A4 centre (-69, 0) radius 11 projected
  circle A5 centre (-46, 0) radius 11 projected
  circle A6 centre (-23, 0) radius 11 projected
  circle A7 centre (0, 0) radius 11 projected
  line L4 (-111.2, 57.65) -> (-103.972, 57.65) construction
  line L5 (-103.972, 57.65) -> (-103.972, 25.9) construction
  line L6 (-103.972, 25.9) -> (-111.2, 25.9) construction
  line L7 (-111.2, 25.9) -> (-111.2, 57.65) construction
  line L8 (42.2, 57.65) -> (34.972, 57.65) construction
  line L9 (34.972, 57.65) -> (34.972, 25.9) construction
  line L10 (34.972, 25.9) -> (42.2, 25.9) construction
  line L11 (42.2, 25.9) -> (42.2, 57.65) construction
  line L12 (-111.2, -57.65) -> (-103.972, -57.65) construction
  line L13 (-103.972, -57.65) -> (-103.972, -25.9) construction
  line L14 (-103.972, -25.9) -> (-111.2, -25.9) construction
  line L15 (-111.2, -25.9) -> (-111.2, -57.65) construction
  line L16 (42.2, -25.9) -> (34.972, -25.9) construction
  line L17 (34.972, -25.9) -> (34.972, -57.65) construction
  line L18 (34.972, -57.65) -> (42.2, -57.65) construction
  line L19 (42.2, -57.65) -> (42.2, -25.9) construction
  circle A8 centre (-103.972, 25.9) radius 3.865
  circle A9 centre (34.972, 25.9) radius 3.865
  circle A10 centre (34.972, -25.9) radius 3.865
  circle A11 centre (-103.972, -25.9) radius 3.865
  dimension "d56" = 7.73
  dimension "d57" = 7.73
  dimension "d58" = 7.73
  dimension "d59" = 7.73
  dimension "d62" = 7.228
  dimension "d63" = 31.75
  dimension "d64" = 7.228
  dimension "d65" = 7.228
  dimension "d66" = 31.75
extrude "Extrusion4" cut sketch "Sketch4" against normal through all contours A8 | A9 | A10 | A11
sketch "Sketch5" plane through (-116.8026, 10, 61.8611) normal (-1, 0, 0) x (0, 0, 1)
  line L0 (-74.8611, -12) -> (-74.8611, -2) projected
  line L1 (-48.8611, -12) -> (-48.8611, -2) projected
  line L2 (-119.5111, 5) -> (-4.2111, 5) projected
  line L3 (-123.7222, 11) -> (0, 11) projected
  line L4 (-74.8611, 5) -> (-48.8611, 5)
  line L5 (-48.8611, 5) -> (-48.8611, 11)
  line L6 (-48.8611, 11) -> (-74.8611, 11)
  line L7 (-74.8611, 11) -> (-74.8611, 5)
  point P0 (-61.8611, -10)
  point P1 (-74.8611, 11)
extrude "Extrusion5" cut sketch "Sketch5" against normal through all
sketch "Sketch6" plane through (0, 10, 0) normal (0, -1, 0) x (1, 0, 0)
  circle A0 centre (34.972, 25.9) radius 3.865 projected
  circle A1 centre (34.972, -25.9) radius 3.865 projected
  circle A2 centre (-103.972, 25.9) radius 3.865 projected
  circle A3 centre (-103.972, -25.9) radius 3.865 projected
  line L0 (47.8026, 61.8611) -> (-116.8026, 61.8611) projected
  line L1 (-116.8026, 61.8611) -> (-116.8026, -61.8611) projected
  line L2 (-116.8026, -61.8611) -> (47.8026, -61.8611) projected
  line L3 (47.8026, -61.8611) -> (47.8026, 61.8611) projected
  arc A4 (-68.5, 12.9904) -> (-68.5, -12.9904) centre (-69, 0) ccw projected
  arc A5 (-46, 25.9808) -> (-68.5, 12.9904) centre (-57.5, 19.9186) ccw projected
  arc A6 (-23, 25.9808) -> (-46, 25.9808) centre (-34.5, 19.9186) ccw projected
  arc A7 (-0.5, 12.9904) -> (-23, 25.9808) centre (-11.5, 19.9186) ccw projected
  arc A8 (-0.5, -12.9904) -> (-0.5, 12.9904) centre (0, 0) ccw projected
  arc A9 (-23, -25.9808) -> (-0.5, -12.9904) centre (-11.5, -19.9186) ccw projected
  arc A10 (-46, -25.9808) -> (-23, -25.9808) centre (-34.5, -19.9186) ccw projected
  arc A11 (-68.5, -12.9904) -> (-46, -25.9808) centre (-57.5, -19.9186) ccw projected
  line L4 (-116.8026, 61.8611) -> (-86.8026, 61.8611) construction
  line L5 (-86.8026, 61.8611) -> (-116.8026, 61.8611) construction
  line L6 (-116.8026, 61.8611) -> (-116.8026, 41.8611) construction
  line L7 (-96.8026, 51.8611) -> (-76.8026, 51.8611)
  line L8 (-76.8026, 51.8611) -> (-76.8026, 31.8611)
  line L9 (-76.8026, 31.8611) -> (-96.8026, 31.8611)
  line L10 (-96.8026, 31.8611) -> (-96.8026, 51.8611)
  line L11 (-96.8026, 51.8611) -> (-76.8026, 31.8611) construction
  line L12 (-76.8026, 51.8611) -> (-96.8026, 31.8611) construction
  line L13 (-94.3026, 49.3611) -> (-79.3026, 49.3611)
  line L14 (-79.3026, 49.3611) -> (-79.3026, 34.3611)
  line L15 (-79.3026, 34.3611) -> (-94.3026, 34.3611)
  line L16 (-94.3026, 34.3611) -> (-94.3026, 49.3611)
  line L17 (-94.3026, 49.3611) -> (-79.3026, 34.3611) construction
  line L18 (-79.3026, 49.3611) -> (-94.3026, 34.3611) construction
  line L19 (-116.8026, 0) -> (47.8026, 0) construction
  line L20 (-96.8026, -51.8611) -> (-76.8026, -51.8611)
  line L21 (-76.8026, -51.8611) -> (-76.8026, -31.8611)
  line L22 (-76.8026, -31.8611) -> (-96.8026, -31.8611)
  line L23 (-96.8026, -31.8611) -> (-96.8026, -51.8611)
  line L24 (-96.8026, -51.8611) -> (-76.8026, -31.8611) construction
  line L25 (-76.8026, -51.8611) -> (-96.8026, -31.8611) construction
  line L26 (-94.3026, -49.3611) -> (-79.3026, -49.3611)
  line L27 (-79.3026, -49.3611) -> (-79.3026, -34.3611)
  line L28 (-79.3026, -34.3611) -> (-94.3026, -34.3611)
  line L29 (-94.3026, -34.3611) -> (-94.3026, -49.3611)
  line L30 (-94.3026, -49.3611) -> (-79.3026, -34.3611) construction
  line L31 (-79.3026, -49.3611) -> (-94.3026, -34.3611) construction
  line L32 (47.8026, 61.8611) -> (17.8026, 61.8611) construction
  line L33 (47.8026, 61.8611) -> (47.8026, 41.8611) construction
  line L34 (10.8026, 48.8611) -> (24.8026, 48.8611)
  line L35 (24.8026, 48.8611) -> (24.8026, 34.8611)
  line L36 (24.8026, 34.8611) -> (10.8026, 34.8611)
  line L37 (10.8026, 34.8611) -> (10.8026, 48.8611)
  line L38 (10.8026, 48.8611) -> (24.8026, 34.8611) construction
  line L39 (24.8026, 48.8611) -> (10.8026, 34.8611) construction
  line L40 (10.8026, -48.8611) -> (24.8026, -48.8611)
  line L41 (24.8026, -48.8611) -> (24.8026, -34.8611)
  line L42 (24.8026, -34.8611) -> (10.8026, -34.8611)
  line L43 (10.8026, -34.8611) -> (10.8026, -48.8611)
  line L44 (10.8026, -48.8611) -> (24.8026, -34.8611) construction
  line L45 (24.8026, -48.8611) -> (10.8026, -34.8611) construction
  point P0 (-86.8026, 41.8611)
  point P1 (-86.8026, 41.8611)
  point P2 (-86.8026, -41.8611)
  point P3 (-86.8026, -41.8611)
  point P4 (17.8026, 41.8611)
  point P5 (17.8026, -41.8611)
  dimension "d76" = 30
  dimension "d77" = 20
  dimension "d78" = 20
  dimension "d79" = 20
  dimension "d80" = 15
  dimension "d81" = 15
  dimension "d82" = 30
  dimension "d83" = 20
  dimension "d84" = 14
  dimension "d85" = 14
extrude "Extrusion6" add sketch "Sketch6" along normal blind 6 contours L7 L8 L9 L10 | L23 L22 L21 L20 | L34 L35 L36 L37 | L43 L42 L41 L40
properties part number "CELLCASE21700_3DPrint"
